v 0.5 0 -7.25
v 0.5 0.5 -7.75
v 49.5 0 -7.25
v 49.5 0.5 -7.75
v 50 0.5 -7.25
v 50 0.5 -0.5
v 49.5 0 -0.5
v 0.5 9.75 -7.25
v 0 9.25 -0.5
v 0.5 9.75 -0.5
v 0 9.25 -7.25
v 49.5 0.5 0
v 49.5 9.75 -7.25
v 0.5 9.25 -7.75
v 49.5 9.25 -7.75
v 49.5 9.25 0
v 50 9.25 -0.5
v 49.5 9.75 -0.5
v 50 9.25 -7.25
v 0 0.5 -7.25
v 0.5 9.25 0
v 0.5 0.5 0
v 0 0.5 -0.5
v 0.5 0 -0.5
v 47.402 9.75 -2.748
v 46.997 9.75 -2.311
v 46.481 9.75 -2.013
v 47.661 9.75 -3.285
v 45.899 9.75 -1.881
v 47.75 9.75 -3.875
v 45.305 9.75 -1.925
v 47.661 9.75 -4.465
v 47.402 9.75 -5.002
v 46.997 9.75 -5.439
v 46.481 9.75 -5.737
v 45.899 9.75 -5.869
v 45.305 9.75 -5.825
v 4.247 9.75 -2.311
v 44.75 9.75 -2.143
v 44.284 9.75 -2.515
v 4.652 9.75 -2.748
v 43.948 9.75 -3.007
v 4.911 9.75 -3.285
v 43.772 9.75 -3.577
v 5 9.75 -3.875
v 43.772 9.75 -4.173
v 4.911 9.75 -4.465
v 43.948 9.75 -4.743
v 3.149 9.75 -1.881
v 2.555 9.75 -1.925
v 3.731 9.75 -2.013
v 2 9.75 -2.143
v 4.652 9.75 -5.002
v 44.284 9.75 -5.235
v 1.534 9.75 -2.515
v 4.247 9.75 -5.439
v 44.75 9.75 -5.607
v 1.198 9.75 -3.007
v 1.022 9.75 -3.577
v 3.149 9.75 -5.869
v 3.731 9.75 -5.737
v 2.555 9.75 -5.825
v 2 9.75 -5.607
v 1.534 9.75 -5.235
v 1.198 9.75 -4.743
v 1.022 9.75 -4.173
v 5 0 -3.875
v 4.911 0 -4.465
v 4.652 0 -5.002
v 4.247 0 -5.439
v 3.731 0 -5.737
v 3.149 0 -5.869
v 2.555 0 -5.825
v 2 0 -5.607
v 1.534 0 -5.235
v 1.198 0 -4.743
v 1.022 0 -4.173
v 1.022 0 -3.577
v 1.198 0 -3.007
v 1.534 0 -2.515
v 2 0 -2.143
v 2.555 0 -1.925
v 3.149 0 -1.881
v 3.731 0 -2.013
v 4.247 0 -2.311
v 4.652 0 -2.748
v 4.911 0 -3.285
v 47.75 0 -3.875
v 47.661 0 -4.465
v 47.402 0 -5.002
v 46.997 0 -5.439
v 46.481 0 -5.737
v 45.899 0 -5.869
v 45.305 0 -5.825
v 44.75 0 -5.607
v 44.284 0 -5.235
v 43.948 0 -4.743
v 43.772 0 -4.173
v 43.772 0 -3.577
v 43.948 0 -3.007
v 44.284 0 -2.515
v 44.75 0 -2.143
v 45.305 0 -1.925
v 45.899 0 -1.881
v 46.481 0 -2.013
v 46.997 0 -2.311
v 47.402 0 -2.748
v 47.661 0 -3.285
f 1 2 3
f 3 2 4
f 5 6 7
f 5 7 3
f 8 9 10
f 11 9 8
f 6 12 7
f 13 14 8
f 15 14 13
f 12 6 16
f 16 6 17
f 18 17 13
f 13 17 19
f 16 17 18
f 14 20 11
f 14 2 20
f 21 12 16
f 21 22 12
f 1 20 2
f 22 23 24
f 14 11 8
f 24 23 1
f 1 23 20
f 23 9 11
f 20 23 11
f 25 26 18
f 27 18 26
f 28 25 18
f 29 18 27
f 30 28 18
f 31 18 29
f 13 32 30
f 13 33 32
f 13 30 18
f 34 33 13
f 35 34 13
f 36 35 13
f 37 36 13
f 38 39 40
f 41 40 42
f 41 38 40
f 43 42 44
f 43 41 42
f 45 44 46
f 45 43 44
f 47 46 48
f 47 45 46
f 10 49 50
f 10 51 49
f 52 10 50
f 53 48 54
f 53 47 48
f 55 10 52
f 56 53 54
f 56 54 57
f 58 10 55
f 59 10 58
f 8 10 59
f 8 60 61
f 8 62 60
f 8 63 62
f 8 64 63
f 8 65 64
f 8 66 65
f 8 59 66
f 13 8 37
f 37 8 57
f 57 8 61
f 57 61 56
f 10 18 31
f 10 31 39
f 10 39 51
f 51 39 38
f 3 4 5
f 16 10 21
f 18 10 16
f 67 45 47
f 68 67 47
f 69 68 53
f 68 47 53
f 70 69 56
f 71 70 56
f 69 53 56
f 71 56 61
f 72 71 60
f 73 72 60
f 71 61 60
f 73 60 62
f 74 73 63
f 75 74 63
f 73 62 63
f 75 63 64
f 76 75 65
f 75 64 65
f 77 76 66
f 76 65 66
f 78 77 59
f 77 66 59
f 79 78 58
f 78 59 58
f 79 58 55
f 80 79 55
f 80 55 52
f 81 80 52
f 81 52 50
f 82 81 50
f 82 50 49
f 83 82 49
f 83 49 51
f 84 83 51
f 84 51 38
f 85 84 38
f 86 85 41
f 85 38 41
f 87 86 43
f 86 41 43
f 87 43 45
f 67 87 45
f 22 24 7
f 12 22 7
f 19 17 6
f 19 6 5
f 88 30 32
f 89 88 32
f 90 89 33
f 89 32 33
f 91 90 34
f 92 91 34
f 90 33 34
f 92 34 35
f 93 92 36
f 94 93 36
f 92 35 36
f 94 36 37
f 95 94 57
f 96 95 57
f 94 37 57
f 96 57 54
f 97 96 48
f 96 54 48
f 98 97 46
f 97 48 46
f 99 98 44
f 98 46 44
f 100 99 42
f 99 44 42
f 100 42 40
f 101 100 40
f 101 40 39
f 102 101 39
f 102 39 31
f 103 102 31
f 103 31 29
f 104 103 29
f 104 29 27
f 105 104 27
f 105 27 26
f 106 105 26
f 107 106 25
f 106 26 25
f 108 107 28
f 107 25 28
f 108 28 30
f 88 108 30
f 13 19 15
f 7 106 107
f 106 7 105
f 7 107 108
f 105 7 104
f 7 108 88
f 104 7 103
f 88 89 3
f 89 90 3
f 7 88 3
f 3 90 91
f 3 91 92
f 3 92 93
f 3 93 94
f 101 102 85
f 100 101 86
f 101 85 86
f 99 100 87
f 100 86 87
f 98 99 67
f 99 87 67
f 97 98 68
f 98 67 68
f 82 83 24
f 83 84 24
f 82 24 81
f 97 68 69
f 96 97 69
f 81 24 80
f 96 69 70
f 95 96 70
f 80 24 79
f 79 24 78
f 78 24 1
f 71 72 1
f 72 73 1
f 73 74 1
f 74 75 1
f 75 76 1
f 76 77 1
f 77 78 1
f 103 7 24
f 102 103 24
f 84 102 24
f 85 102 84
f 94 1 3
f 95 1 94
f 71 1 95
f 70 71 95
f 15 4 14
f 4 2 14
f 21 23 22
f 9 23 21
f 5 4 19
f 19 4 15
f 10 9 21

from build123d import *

# Parameters (mm, degrees)
SKETCH1_W           = 7.75
SKETCH1_H           = 9.75
BOSS_EXTRUDE1_DEPTH = 50
SKETCH4_R           = 2
CUT_EXTRUDE3_DEPTH  = 9.75
CHAMFER1_SIZE       = 0.5


with BuildPart() as part:
    # Sketch1 → Boss-Extrude1 (new body)
    with BuildSketch(Plane(origin=(0, 0, 0), x_dir=(0, 0, -1), z_dir=(1, 0, 0))):
        with Locations((3.875, 4.875)):
            Rectangle(SKETCH1_W, SKETCH1_H)
    extrude(amount=BOSS_EXTRUDE1_DEPTH)

    # Sketch4 → Cut-Extrude3 (cut)
    with BuildSketch(Plane(origin=(0, 9.75, 0), x_dir=(1, 0, 0), z_dir=(0, 1, 0))):
        with Locations((3, 3.875)):
            Circle(SKETCH4_R)
        with Locations((45.75, 3.875)):
            Circle(SKETCH4_R)
    extrude(amount=-CUT_EXTRUDE3_DEPTH, mode=Mode.SUBTRACT)

    # Chamfer1
    chamfer1_edges = [part.edges().sort_by_distance(p)[0] for p in [
        (50, 4.875, -7.75),
        (50, 9.75, -3.875),
        (50, 4.875, 0),
        (0, 9.75, -3.875),
        (0, 4.875, -7.75),
        (0, 0, -3.875),
        (0, 4.875, 0),
        (25, 9.75, 0),
        (25, 9.75, -7.75),
        (25, 0, -7.75),
        (25, 0, 0),
        (50, 0, -3.875),
    ]]
    chamfer(chamfer1_edges, length=CHAMFER1_SIZE)


solid = part.part
